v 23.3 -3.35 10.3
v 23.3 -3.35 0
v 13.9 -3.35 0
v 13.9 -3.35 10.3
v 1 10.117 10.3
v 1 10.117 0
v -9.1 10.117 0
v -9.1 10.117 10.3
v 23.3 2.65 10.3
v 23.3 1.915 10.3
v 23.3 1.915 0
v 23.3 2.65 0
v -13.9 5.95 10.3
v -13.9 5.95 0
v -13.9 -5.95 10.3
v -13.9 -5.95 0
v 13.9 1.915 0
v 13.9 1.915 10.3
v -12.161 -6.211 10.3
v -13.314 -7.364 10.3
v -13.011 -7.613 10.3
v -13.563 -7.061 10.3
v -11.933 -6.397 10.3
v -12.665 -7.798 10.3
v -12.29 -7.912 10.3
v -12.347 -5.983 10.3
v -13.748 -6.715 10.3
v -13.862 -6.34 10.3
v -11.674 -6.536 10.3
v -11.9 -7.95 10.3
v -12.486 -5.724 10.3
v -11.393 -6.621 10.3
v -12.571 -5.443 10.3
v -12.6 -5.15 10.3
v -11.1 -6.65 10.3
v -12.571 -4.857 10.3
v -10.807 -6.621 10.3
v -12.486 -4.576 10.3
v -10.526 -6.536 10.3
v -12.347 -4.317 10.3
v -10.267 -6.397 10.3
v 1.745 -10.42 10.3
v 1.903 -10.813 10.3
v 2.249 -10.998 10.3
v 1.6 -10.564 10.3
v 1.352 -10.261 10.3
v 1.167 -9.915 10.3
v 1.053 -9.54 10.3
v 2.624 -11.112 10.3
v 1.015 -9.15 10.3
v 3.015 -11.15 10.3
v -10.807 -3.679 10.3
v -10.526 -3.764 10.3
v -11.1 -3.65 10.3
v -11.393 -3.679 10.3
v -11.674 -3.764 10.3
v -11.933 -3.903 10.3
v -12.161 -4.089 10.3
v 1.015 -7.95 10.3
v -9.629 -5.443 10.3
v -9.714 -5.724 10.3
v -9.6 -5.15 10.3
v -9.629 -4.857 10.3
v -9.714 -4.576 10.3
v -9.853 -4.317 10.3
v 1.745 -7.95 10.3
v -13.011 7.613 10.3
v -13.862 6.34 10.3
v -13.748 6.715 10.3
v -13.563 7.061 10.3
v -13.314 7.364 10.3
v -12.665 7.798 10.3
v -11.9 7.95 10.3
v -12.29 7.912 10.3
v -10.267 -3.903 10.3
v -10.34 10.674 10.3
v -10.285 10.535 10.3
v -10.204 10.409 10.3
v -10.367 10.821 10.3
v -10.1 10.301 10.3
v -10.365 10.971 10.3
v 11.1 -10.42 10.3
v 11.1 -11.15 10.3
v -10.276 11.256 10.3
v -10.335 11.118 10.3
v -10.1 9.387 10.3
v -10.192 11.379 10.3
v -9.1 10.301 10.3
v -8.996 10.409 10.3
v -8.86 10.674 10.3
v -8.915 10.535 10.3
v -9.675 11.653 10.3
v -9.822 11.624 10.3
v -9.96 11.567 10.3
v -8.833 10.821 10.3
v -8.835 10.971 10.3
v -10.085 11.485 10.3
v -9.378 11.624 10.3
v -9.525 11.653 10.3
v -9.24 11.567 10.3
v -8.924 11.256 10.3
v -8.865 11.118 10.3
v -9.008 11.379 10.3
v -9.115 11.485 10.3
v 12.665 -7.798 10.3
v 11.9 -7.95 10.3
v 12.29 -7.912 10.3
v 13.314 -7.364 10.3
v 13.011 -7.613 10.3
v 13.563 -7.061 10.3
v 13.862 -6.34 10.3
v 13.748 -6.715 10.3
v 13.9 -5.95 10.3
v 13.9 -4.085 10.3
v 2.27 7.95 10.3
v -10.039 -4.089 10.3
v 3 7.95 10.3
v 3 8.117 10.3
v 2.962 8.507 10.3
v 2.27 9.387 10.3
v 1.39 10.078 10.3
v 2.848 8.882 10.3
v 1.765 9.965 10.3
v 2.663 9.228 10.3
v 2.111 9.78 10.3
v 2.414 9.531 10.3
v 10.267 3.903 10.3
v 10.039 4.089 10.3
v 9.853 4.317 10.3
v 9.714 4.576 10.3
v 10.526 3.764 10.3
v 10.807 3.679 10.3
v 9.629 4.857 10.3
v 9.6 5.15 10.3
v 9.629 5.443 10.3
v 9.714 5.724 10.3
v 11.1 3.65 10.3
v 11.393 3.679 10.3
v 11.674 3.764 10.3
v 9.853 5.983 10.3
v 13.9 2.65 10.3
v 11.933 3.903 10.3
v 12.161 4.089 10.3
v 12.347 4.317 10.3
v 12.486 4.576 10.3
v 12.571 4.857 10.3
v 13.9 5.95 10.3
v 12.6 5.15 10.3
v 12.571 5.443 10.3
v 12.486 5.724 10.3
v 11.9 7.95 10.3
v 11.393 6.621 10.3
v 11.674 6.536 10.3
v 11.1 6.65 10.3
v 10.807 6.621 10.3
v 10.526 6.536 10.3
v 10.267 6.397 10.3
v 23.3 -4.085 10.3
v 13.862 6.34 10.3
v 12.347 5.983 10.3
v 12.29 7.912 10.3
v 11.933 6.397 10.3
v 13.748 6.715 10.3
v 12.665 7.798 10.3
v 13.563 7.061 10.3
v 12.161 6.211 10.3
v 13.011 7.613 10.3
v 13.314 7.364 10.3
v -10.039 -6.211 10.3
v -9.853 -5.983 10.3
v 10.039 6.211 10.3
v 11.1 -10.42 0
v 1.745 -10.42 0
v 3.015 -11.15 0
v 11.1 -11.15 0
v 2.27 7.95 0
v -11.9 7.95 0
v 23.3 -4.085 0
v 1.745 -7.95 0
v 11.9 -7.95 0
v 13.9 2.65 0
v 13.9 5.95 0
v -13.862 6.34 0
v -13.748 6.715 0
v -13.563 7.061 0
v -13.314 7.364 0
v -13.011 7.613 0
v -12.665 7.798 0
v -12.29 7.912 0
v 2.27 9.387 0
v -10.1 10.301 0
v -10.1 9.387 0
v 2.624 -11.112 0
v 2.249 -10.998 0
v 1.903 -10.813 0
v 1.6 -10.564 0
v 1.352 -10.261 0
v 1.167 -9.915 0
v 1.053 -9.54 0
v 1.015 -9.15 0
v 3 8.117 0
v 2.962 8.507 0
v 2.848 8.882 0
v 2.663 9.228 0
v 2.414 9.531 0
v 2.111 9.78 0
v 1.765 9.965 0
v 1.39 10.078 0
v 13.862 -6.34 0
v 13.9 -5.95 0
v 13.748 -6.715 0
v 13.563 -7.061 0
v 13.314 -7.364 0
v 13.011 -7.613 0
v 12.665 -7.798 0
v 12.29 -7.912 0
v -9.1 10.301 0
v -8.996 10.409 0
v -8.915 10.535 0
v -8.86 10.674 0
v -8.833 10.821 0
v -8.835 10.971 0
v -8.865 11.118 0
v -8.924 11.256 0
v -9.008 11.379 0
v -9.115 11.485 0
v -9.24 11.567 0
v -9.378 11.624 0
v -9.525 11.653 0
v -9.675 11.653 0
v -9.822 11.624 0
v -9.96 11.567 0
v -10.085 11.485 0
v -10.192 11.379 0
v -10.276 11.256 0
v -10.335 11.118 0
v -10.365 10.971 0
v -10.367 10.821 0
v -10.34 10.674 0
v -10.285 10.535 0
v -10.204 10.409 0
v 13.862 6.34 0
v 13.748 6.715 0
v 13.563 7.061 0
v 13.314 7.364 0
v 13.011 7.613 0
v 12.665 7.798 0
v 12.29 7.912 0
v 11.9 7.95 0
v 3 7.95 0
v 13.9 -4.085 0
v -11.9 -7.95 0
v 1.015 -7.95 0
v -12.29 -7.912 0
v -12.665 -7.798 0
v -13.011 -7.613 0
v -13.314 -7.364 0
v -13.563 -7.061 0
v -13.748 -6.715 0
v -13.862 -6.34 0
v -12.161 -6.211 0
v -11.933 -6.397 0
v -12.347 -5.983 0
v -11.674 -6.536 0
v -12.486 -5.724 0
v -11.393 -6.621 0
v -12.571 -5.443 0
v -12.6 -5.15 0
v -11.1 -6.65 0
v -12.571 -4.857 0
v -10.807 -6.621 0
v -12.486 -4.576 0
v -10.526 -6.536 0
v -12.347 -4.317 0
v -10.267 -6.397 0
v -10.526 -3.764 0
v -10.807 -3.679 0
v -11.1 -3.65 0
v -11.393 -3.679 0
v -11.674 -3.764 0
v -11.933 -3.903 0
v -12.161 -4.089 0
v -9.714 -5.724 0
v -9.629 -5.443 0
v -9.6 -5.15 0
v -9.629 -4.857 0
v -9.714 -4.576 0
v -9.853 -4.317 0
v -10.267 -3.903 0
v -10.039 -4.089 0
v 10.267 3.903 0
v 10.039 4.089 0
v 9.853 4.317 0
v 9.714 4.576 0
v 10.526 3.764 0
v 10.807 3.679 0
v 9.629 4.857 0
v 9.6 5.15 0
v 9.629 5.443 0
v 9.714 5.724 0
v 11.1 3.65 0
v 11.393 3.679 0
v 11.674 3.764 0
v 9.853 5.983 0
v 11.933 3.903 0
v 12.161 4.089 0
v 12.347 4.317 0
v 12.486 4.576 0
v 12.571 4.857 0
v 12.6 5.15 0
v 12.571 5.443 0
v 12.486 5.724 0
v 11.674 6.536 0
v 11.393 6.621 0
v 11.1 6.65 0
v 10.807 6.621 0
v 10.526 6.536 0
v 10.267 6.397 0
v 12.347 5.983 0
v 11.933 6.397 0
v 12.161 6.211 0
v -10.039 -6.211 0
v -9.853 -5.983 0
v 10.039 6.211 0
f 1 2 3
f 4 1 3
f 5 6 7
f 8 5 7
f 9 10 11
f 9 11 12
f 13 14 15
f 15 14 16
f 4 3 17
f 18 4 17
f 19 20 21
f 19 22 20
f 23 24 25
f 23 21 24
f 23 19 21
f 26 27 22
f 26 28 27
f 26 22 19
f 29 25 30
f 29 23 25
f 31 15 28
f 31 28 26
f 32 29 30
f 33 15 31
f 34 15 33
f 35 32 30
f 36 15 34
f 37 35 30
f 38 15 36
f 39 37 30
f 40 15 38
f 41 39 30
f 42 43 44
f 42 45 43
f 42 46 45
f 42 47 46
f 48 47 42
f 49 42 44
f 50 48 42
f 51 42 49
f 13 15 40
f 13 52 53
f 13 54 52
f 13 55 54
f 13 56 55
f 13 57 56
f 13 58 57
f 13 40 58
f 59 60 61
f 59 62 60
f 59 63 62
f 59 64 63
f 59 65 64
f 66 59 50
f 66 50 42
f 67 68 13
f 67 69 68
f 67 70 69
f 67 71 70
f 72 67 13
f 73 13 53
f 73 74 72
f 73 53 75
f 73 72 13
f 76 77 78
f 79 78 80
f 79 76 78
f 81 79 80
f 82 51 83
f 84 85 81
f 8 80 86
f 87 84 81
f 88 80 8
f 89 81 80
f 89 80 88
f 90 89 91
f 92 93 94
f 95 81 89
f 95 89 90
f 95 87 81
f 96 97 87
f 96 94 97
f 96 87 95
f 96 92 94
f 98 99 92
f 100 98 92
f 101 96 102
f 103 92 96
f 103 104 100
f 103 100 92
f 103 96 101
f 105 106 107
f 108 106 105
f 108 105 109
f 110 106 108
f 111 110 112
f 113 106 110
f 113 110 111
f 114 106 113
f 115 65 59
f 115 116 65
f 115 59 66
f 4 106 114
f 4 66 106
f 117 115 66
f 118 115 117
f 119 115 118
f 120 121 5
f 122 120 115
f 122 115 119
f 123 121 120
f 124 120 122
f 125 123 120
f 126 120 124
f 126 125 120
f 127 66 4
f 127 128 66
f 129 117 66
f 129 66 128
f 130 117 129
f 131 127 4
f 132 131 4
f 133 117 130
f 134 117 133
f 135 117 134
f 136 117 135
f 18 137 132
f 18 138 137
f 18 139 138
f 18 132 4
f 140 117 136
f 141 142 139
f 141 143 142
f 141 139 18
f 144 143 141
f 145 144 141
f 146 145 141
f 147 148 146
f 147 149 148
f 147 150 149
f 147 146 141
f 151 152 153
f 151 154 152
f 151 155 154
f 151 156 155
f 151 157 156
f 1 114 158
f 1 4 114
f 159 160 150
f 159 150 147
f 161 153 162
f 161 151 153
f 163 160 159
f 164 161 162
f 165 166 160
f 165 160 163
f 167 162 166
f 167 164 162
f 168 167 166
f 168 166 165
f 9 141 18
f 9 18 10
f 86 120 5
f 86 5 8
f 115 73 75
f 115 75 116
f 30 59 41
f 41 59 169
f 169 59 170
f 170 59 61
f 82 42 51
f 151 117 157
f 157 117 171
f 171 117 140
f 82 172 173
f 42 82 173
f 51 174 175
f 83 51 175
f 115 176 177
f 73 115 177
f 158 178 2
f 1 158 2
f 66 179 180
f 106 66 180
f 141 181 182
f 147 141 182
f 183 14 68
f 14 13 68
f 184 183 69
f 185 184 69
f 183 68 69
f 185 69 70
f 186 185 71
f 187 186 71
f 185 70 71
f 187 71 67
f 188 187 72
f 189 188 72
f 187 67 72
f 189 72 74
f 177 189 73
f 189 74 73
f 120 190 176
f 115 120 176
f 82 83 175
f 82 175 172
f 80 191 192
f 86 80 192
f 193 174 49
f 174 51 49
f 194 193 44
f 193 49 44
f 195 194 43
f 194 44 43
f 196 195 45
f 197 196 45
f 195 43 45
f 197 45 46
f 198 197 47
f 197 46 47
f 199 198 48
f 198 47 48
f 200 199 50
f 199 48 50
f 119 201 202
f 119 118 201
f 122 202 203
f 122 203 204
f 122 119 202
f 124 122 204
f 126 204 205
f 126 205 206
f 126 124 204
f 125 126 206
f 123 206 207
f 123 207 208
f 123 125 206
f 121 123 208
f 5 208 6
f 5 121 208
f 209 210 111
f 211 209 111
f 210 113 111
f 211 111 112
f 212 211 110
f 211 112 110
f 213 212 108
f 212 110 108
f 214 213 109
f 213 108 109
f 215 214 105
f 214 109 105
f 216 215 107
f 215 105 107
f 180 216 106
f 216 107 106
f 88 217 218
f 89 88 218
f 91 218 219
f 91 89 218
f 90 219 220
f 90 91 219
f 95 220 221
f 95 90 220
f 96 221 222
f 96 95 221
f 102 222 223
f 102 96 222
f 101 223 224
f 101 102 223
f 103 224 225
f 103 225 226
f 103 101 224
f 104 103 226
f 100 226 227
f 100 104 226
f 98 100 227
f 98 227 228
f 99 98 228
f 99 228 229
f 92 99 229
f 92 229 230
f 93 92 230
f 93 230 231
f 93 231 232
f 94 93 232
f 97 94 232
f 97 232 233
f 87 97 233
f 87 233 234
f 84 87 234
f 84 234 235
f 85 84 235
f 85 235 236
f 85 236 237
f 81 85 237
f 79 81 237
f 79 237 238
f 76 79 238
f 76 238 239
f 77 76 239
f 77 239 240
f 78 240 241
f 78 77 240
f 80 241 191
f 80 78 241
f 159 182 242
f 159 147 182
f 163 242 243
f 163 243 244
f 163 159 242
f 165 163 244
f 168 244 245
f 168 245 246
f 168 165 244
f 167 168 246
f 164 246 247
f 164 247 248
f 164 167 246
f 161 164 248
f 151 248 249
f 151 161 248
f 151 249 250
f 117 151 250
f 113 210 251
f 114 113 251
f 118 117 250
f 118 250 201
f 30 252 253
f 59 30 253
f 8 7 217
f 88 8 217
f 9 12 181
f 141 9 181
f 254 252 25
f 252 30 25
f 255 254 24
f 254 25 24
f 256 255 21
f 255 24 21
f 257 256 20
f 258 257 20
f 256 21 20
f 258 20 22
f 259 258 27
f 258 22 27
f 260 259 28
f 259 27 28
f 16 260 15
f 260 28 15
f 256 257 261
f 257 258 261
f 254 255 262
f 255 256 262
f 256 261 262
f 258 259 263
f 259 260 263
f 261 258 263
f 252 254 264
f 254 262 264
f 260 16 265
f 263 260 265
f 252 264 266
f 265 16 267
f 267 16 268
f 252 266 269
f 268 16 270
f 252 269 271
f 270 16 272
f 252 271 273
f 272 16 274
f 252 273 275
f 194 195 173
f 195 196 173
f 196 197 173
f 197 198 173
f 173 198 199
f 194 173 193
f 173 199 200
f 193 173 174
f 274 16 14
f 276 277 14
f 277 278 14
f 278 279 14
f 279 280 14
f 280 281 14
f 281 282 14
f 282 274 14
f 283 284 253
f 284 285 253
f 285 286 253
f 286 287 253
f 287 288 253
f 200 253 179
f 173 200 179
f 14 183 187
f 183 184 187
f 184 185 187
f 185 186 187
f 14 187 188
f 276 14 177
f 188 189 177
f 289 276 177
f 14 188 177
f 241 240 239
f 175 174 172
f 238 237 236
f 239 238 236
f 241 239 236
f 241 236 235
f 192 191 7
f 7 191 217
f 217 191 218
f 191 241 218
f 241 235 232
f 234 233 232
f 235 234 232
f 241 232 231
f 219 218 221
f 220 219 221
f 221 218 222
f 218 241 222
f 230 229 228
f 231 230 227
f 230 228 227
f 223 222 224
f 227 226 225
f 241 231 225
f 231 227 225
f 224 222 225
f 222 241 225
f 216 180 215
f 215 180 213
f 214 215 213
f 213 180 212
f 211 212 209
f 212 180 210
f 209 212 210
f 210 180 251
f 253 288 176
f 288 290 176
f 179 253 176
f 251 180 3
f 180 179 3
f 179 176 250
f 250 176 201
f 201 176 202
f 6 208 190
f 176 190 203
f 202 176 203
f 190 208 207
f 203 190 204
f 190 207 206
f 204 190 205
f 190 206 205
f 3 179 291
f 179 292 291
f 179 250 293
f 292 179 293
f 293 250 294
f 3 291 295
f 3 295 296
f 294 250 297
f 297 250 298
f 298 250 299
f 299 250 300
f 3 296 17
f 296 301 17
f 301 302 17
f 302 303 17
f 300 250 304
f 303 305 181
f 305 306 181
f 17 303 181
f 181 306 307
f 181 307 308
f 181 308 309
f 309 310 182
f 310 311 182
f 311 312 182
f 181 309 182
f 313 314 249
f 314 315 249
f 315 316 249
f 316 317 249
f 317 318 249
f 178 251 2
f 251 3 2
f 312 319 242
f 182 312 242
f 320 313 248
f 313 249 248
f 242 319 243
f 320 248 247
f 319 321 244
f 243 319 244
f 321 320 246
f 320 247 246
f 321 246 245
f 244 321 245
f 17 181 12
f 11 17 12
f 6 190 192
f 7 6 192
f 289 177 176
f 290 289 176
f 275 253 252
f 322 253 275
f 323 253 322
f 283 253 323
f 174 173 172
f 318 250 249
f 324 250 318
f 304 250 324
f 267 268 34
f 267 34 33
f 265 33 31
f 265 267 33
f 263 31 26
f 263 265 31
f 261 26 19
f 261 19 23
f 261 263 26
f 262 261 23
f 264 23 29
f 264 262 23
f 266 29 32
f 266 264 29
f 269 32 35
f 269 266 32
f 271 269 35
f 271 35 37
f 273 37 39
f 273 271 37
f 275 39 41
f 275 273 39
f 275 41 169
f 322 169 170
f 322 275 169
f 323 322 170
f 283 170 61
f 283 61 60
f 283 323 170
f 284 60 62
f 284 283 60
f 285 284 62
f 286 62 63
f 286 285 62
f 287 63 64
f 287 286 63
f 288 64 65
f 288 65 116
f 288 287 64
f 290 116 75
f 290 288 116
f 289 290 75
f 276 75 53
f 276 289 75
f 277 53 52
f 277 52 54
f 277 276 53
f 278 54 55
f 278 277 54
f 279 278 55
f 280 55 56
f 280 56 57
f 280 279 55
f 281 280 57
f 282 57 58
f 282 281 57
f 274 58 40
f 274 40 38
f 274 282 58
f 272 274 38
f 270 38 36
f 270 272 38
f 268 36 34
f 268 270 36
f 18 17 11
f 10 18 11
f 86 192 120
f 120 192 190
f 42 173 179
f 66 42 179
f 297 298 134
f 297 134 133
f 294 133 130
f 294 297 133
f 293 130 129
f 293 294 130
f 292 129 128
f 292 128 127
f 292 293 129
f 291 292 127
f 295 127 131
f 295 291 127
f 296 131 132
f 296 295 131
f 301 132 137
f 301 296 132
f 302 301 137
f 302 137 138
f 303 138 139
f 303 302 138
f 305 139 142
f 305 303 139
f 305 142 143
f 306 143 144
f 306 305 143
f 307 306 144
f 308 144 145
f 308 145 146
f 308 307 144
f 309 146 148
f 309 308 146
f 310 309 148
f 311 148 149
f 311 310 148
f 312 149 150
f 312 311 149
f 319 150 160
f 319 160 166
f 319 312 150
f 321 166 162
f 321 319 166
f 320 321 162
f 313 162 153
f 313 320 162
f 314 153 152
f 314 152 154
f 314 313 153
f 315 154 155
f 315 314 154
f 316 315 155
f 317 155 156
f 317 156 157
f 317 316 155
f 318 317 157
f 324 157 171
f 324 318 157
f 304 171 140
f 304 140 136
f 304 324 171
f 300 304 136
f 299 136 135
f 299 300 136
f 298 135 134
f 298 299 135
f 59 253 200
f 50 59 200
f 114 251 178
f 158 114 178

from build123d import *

# Parameters (mm, degrees)
IZIM1_R                     = 1.5
Y_KSEKLIK_EKSTR_ZYON1_DEPTH = 10.3
RADYUS2_R                   = 2
IZIM4_R                     = 0.77
Y_KSEKLIK_EKSTR_ZYON2_DEPTH = 10.3


with BuildPart() as part:
    # Çizim1 → Yükseklik-Ekstrüzyon1 (new body)
    with BuildSketch(Plane.XY):
        with BuildLine():
            Line((13.9, -4.084784969), (22.330620506, -4.084784969))
            Line((22.330620506, -4.084784969), (23.3, -4.084784969))
            Line((23.3, -4.084784969), (23.3, -3.910005756))
            Line((23.3, -3.910005756), (23.3, -3.608421024))
            Line((23.3, -3.608421024), (23.3, -3.349919826))
            Line((23.3, -3.349919826), (22.330620506, -3.349919826))
            Line((22.330620506, -3.349919826), (13.9, -3.349919826))
            Line((13.9, -3.349919826), (13.9, 1.915215031))
            Line((13.9, 1.915215031), (22.330620506, 1.915215031))
            Line((22.330620506, 1.915215031), (23.3, 1.915215031))
            Line((23.3, 1.915215031), (23.3, 2.089994244))
            Line((23.3, 2.089994244), (23.3, 2.391578976))
            Line((23.3, 2.391578976), (23.3, 2.650080174))
            Line((23.3, 2.650080174), (22.330620506, 2.650080174))
            Line((22.330620506, 2.650080174), (13.9, 2.650080174))
            Line((13.9, 2.650080174), (13.9, 7.95))
            Line((13.9, 7.95), (3, 7.95))
            Line((3, 7.95), (3, 10.116757373))
            Line((3, 10.116757373), (-9.1, 10.116757373))
            Line((-9.1, 10.116757373), (-9.1, 10.886757373))
            ThreePointArc((-9.1, 10.886757373), (-9.6, 11.386757373), (-10.1, 10.886757373))
            Line((-10.1, 10.886757373), (-10.1, 9.386757373))
            Line((-10.1, 9.386757373), (-9.1, 9.386757373))
            Line((-9.1, 9.386757373), (2.27, 9.386757373))
            Line((2.27, 9.386757373), (2.27, 7.95))
            Line((2.27, 7.95), (-13.9, 7.95))
            Line((-13.9, 7.95), (-13.9, -7.95))
            Line((-13.9, -7.95), (1.014637994, -7.95))
            Line((1.014637994, -7.95), (1.014637994, -11.15))
            Line((1.014637994, -11.15), (11.1, -11.15))
            Line((11.1, -11.15), (11.1, -10.42))
            Line((11.1, -10.42), (1.744637994, -10.42))
            Line((1.744637994, -10.42), (1.744637994, -7.95))
            Line((1.744637994, -7.95), (13.9, -7.95))
            Line((13.9, -7.95), (13.9, -4.084784969))
        make_face()
        with Locations(Location((11.1, 5.15, 0), (0, 0, 180))):
            Circle(IZIM1_R, mode=Mode.SUBTRACT)
        with Locations(Location((-11.1, -5.15, 0), (0, 0, 180))):
            Circle(IZIM1_R, mode=Mode.SUBTRACT)
    extrude(amount=Y_KSEKLIK_EKSTR_ZYON1_DEPTH)

    # Radyus2
    radyus2_edges = [part.edges().sort_by_distance(p)[0] for p in [
        (1.014637994, -11.15, 5.15),
        (-13.9, -7.95, 5.15),
        (-13.9, 7.95, 5.15),
        (3, 10.116757373, 5.15),
        (13.9, 7.95, 5.15),
        (13.9, -7.95, 5.15),
    ]]
    fillet(radyus2_edges, radius=RADYUS2_R)

    # Çizim4 → Yükseklik-Ekstrüzyon2 (add)
    with BuildSketch(Plane.XY.offset(10.3)):
        with Locations((-9.6, 10.886757373)):
            Circle(IZIM4_R)
    extrude(amount=-Y_KSEKLIK_EKSTR_ZYON2_DEPTH)


solid = part.part
